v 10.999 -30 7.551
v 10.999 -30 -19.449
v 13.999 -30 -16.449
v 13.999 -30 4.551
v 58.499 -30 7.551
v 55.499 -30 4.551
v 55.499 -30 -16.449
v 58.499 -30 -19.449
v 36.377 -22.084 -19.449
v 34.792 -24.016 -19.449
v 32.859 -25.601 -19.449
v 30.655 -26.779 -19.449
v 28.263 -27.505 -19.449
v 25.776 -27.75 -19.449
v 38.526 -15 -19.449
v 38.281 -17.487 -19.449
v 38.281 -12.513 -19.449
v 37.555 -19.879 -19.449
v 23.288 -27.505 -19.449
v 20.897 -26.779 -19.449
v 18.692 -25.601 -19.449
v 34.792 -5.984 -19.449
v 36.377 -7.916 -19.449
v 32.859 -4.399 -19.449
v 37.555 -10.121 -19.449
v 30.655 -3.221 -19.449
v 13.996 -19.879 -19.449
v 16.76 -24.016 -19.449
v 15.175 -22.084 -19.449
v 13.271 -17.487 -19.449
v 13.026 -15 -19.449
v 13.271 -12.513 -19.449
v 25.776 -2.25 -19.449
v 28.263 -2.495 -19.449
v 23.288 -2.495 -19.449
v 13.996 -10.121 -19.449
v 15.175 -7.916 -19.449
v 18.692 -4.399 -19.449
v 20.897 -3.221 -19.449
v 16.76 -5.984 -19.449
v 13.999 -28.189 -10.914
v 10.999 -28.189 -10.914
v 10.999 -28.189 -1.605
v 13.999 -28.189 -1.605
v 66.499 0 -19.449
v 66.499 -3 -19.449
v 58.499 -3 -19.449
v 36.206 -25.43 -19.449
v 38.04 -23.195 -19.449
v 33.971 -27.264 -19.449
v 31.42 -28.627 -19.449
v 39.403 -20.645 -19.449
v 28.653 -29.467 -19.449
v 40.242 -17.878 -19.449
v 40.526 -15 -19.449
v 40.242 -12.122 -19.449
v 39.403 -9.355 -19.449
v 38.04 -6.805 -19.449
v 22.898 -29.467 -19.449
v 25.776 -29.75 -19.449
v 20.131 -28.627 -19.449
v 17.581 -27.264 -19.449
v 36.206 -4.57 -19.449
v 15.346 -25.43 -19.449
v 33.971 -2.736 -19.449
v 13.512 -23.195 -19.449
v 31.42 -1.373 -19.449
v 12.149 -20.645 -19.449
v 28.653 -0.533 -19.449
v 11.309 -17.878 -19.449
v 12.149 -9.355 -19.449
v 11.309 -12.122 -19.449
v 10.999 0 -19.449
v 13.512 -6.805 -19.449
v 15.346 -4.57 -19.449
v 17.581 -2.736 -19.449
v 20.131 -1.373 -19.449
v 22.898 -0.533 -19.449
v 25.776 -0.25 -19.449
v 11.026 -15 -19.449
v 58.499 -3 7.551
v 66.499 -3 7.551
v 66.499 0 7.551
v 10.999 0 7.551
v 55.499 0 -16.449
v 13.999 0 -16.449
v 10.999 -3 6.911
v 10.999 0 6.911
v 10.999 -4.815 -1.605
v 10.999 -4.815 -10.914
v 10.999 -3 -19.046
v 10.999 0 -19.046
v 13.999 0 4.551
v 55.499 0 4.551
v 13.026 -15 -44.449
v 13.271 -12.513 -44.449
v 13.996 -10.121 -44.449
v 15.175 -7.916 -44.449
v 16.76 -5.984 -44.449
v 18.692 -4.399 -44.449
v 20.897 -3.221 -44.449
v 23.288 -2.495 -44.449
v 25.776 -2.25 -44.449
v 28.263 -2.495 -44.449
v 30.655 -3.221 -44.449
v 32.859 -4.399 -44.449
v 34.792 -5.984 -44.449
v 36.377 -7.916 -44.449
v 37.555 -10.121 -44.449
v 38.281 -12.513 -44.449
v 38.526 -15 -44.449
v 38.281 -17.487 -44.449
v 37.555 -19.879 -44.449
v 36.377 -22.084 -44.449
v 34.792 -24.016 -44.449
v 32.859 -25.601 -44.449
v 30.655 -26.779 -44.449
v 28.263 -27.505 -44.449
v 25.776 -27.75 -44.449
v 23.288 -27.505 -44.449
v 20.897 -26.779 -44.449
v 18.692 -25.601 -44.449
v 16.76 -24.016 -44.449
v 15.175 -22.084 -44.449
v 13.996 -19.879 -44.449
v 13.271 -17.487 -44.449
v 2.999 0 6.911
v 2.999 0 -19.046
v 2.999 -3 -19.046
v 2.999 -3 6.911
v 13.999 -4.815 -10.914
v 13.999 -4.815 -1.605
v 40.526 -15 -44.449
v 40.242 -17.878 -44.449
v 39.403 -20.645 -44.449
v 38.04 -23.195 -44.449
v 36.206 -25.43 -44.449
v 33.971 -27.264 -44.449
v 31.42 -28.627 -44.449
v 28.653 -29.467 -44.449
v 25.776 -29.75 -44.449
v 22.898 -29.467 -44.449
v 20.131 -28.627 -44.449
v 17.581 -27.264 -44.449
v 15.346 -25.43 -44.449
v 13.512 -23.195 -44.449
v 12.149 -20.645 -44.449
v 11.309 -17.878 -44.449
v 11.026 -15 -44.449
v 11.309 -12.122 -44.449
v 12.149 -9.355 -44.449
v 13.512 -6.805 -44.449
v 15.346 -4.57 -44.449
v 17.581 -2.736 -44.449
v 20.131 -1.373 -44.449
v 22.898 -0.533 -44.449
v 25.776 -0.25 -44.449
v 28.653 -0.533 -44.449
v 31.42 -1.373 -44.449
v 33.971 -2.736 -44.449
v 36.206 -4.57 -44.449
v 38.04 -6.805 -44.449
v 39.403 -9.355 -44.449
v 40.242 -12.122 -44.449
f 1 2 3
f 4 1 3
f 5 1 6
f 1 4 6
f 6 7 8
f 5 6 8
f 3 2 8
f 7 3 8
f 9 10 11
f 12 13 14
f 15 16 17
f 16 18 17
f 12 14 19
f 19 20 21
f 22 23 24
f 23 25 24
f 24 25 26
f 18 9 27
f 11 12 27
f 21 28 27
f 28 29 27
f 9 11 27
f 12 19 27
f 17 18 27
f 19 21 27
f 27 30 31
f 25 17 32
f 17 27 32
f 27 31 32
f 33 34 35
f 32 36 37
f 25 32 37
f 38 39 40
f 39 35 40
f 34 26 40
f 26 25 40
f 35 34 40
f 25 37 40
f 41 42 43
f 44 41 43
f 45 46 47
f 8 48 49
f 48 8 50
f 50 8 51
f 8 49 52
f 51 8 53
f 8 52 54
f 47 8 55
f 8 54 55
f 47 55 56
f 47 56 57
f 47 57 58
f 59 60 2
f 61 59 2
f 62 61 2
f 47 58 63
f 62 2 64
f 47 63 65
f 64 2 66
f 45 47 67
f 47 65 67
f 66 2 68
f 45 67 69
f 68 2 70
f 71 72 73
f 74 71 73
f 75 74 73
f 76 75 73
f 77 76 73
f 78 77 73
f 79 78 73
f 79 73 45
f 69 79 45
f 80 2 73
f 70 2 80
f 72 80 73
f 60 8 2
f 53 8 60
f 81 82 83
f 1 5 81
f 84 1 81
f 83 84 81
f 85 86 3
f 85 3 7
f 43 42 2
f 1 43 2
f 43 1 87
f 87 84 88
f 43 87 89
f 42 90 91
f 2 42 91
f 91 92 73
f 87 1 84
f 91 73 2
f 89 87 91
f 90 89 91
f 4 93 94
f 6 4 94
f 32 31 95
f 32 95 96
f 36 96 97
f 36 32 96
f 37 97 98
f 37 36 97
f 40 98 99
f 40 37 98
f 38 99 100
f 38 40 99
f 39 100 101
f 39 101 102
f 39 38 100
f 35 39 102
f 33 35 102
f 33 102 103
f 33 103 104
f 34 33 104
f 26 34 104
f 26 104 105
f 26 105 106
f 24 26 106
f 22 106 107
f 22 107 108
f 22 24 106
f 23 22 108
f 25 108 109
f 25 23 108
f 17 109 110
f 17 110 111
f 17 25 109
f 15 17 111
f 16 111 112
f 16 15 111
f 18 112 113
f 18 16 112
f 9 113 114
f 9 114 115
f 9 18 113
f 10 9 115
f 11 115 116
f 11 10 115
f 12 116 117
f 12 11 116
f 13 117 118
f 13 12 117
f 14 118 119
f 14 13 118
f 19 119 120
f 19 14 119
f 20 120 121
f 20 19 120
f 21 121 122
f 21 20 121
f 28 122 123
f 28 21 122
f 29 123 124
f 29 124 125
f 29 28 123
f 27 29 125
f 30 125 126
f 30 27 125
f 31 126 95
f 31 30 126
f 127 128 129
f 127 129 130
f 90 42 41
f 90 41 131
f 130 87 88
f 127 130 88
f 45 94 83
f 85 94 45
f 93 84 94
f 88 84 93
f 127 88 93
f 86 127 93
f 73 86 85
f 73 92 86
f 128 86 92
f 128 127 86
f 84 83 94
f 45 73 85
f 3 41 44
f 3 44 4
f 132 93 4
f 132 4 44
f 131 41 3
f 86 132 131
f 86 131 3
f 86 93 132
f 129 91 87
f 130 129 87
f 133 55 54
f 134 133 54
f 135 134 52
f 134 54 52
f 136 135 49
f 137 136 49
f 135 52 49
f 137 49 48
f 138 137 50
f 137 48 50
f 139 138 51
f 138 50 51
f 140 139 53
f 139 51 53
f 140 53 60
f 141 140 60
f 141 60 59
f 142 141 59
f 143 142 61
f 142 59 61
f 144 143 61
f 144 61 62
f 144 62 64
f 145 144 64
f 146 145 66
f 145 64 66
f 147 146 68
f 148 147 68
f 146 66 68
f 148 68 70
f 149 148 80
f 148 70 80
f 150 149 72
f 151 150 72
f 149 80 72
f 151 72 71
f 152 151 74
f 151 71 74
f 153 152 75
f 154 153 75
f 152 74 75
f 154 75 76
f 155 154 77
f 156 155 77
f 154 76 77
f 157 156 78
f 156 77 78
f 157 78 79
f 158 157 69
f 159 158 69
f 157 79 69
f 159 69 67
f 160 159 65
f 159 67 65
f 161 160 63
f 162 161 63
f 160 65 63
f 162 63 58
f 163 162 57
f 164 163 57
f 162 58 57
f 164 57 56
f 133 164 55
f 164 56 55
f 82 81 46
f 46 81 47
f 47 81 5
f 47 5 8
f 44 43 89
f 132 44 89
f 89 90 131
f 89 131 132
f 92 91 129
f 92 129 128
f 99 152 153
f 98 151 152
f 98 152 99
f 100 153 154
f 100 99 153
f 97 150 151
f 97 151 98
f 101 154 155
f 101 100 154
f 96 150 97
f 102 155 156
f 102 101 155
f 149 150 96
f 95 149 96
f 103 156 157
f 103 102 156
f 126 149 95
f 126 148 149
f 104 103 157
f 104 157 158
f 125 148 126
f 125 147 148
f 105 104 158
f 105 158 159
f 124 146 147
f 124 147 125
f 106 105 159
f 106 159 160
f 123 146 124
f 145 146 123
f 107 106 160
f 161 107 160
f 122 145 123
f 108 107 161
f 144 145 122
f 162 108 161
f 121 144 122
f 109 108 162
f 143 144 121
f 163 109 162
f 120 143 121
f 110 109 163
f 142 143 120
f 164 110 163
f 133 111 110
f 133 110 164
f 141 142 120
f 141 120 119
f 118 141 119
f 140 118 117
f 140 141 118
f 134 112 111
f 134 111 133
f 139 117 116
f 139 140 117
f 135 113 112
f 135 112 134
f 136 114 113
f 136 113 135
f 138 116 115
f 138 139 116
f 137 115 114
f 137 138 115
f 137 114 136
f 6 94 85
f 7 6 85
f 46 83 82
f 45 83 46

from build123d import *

# Parameters (mm, degrees)
SKETCH1_W           = 47.5
SKETCH1_H           = 27
SKETCH1_W_2         = 41.5
SKETCH1_H_2         = 21
BOSS_EXTRUDE2_DEPTH = 30
SKETCH2_W           = 9.308114218
SKETCH2_H           = 23.373709037
CUT_EXTRUDE1_DEPTH  = 30
SKETCH3_W           = 25.956751415
SKETCH3_H           = 3
BOSS_EXTRUDE3_DEPTH = 8
SKETCH4_W           = 27
SKETCH4_H           = 3
BOSS_EXTRUDE4_DEPTH = 8
SKETCH5_R           = 14.75
SKETCH5_R_2         = 12.75
BOSS_EXTRUDE5_DEPTH = 25


with BuildPart() as part:
    # Sketch1 → Boss-Extrude2 (new body)
    with BuildSketch(Plane(origin=(0, 0, 0), x_dir=(1, 0, 0), z_dir=(0, 1, 0))):
        with Locations((34.749341264, 5.949225985)):
            Rectangle(SKETCH1_W, SKETCH1_H)
        with Locations((34.749341264, 5.949225985)):
            Rectangle(SKETCH1_W_2, SKETCH1_H_2, mode=Mode.SUBTRACT)
    extrude(amount=-BOSS_EXTRUDE2_DEPTH)

    # Sketch2 → Cut-Extrude1 (cut)
    with BuildSketch(Plane.ZY.offset(-10.999341264)):
        with Locations((-6.259496459, -16.501916984)):
            Rectangle(SKETCH2_W, SKETCH2_H)
    extrude(amount=-CUT_EXTRUDE1_DEPTH, mode=Mode.SUBTRACT)

    # Sketch3 → Boss-Extrude3 (add)
    with BuildSketch(Plane.ZY.offset(-10.999341264)):
        with Locations((-6.067211219, -1.5)):
            Rectangle(SKETCH3_W, SKETCH3_H)
    extrude(amount=BOSS_EXTRUDE3_DEPTH)

    # Sketch4 → Boss-Extrude4 (add)
    with BuildSketch(Plane(origin=(58.499341264, 0, 0), x_dir=(0, 0, -1), z_dir=(1, 0, 0))):
        with Locations((5.949225985, -1.5)):
            Rectangle(SKETCH4_W, SKETCH4_H)
    extrude(amount=BOSS_EXTRUDE4_DEPTH)

    # Sketch5 → Boss-Extrude5 (add)
    with BuildSketch(Plane(origin=(0, 0, -19.449225985), x_dir=(-1, 0, 0), z_dir=(0, 0, -1))):
        with Locations(Location((-25.775893869, -15, 0), (0, 0, 180))):
            Circle(SKETCH5_R)
        with Locations((-25.775893869, -15)):
            Circle(SKETCH5_R_2, mode=Mode.SUBTRACT)
    extrude(amount=BOSS_EXTRUDE5_DEPTH)


solid = part.part
